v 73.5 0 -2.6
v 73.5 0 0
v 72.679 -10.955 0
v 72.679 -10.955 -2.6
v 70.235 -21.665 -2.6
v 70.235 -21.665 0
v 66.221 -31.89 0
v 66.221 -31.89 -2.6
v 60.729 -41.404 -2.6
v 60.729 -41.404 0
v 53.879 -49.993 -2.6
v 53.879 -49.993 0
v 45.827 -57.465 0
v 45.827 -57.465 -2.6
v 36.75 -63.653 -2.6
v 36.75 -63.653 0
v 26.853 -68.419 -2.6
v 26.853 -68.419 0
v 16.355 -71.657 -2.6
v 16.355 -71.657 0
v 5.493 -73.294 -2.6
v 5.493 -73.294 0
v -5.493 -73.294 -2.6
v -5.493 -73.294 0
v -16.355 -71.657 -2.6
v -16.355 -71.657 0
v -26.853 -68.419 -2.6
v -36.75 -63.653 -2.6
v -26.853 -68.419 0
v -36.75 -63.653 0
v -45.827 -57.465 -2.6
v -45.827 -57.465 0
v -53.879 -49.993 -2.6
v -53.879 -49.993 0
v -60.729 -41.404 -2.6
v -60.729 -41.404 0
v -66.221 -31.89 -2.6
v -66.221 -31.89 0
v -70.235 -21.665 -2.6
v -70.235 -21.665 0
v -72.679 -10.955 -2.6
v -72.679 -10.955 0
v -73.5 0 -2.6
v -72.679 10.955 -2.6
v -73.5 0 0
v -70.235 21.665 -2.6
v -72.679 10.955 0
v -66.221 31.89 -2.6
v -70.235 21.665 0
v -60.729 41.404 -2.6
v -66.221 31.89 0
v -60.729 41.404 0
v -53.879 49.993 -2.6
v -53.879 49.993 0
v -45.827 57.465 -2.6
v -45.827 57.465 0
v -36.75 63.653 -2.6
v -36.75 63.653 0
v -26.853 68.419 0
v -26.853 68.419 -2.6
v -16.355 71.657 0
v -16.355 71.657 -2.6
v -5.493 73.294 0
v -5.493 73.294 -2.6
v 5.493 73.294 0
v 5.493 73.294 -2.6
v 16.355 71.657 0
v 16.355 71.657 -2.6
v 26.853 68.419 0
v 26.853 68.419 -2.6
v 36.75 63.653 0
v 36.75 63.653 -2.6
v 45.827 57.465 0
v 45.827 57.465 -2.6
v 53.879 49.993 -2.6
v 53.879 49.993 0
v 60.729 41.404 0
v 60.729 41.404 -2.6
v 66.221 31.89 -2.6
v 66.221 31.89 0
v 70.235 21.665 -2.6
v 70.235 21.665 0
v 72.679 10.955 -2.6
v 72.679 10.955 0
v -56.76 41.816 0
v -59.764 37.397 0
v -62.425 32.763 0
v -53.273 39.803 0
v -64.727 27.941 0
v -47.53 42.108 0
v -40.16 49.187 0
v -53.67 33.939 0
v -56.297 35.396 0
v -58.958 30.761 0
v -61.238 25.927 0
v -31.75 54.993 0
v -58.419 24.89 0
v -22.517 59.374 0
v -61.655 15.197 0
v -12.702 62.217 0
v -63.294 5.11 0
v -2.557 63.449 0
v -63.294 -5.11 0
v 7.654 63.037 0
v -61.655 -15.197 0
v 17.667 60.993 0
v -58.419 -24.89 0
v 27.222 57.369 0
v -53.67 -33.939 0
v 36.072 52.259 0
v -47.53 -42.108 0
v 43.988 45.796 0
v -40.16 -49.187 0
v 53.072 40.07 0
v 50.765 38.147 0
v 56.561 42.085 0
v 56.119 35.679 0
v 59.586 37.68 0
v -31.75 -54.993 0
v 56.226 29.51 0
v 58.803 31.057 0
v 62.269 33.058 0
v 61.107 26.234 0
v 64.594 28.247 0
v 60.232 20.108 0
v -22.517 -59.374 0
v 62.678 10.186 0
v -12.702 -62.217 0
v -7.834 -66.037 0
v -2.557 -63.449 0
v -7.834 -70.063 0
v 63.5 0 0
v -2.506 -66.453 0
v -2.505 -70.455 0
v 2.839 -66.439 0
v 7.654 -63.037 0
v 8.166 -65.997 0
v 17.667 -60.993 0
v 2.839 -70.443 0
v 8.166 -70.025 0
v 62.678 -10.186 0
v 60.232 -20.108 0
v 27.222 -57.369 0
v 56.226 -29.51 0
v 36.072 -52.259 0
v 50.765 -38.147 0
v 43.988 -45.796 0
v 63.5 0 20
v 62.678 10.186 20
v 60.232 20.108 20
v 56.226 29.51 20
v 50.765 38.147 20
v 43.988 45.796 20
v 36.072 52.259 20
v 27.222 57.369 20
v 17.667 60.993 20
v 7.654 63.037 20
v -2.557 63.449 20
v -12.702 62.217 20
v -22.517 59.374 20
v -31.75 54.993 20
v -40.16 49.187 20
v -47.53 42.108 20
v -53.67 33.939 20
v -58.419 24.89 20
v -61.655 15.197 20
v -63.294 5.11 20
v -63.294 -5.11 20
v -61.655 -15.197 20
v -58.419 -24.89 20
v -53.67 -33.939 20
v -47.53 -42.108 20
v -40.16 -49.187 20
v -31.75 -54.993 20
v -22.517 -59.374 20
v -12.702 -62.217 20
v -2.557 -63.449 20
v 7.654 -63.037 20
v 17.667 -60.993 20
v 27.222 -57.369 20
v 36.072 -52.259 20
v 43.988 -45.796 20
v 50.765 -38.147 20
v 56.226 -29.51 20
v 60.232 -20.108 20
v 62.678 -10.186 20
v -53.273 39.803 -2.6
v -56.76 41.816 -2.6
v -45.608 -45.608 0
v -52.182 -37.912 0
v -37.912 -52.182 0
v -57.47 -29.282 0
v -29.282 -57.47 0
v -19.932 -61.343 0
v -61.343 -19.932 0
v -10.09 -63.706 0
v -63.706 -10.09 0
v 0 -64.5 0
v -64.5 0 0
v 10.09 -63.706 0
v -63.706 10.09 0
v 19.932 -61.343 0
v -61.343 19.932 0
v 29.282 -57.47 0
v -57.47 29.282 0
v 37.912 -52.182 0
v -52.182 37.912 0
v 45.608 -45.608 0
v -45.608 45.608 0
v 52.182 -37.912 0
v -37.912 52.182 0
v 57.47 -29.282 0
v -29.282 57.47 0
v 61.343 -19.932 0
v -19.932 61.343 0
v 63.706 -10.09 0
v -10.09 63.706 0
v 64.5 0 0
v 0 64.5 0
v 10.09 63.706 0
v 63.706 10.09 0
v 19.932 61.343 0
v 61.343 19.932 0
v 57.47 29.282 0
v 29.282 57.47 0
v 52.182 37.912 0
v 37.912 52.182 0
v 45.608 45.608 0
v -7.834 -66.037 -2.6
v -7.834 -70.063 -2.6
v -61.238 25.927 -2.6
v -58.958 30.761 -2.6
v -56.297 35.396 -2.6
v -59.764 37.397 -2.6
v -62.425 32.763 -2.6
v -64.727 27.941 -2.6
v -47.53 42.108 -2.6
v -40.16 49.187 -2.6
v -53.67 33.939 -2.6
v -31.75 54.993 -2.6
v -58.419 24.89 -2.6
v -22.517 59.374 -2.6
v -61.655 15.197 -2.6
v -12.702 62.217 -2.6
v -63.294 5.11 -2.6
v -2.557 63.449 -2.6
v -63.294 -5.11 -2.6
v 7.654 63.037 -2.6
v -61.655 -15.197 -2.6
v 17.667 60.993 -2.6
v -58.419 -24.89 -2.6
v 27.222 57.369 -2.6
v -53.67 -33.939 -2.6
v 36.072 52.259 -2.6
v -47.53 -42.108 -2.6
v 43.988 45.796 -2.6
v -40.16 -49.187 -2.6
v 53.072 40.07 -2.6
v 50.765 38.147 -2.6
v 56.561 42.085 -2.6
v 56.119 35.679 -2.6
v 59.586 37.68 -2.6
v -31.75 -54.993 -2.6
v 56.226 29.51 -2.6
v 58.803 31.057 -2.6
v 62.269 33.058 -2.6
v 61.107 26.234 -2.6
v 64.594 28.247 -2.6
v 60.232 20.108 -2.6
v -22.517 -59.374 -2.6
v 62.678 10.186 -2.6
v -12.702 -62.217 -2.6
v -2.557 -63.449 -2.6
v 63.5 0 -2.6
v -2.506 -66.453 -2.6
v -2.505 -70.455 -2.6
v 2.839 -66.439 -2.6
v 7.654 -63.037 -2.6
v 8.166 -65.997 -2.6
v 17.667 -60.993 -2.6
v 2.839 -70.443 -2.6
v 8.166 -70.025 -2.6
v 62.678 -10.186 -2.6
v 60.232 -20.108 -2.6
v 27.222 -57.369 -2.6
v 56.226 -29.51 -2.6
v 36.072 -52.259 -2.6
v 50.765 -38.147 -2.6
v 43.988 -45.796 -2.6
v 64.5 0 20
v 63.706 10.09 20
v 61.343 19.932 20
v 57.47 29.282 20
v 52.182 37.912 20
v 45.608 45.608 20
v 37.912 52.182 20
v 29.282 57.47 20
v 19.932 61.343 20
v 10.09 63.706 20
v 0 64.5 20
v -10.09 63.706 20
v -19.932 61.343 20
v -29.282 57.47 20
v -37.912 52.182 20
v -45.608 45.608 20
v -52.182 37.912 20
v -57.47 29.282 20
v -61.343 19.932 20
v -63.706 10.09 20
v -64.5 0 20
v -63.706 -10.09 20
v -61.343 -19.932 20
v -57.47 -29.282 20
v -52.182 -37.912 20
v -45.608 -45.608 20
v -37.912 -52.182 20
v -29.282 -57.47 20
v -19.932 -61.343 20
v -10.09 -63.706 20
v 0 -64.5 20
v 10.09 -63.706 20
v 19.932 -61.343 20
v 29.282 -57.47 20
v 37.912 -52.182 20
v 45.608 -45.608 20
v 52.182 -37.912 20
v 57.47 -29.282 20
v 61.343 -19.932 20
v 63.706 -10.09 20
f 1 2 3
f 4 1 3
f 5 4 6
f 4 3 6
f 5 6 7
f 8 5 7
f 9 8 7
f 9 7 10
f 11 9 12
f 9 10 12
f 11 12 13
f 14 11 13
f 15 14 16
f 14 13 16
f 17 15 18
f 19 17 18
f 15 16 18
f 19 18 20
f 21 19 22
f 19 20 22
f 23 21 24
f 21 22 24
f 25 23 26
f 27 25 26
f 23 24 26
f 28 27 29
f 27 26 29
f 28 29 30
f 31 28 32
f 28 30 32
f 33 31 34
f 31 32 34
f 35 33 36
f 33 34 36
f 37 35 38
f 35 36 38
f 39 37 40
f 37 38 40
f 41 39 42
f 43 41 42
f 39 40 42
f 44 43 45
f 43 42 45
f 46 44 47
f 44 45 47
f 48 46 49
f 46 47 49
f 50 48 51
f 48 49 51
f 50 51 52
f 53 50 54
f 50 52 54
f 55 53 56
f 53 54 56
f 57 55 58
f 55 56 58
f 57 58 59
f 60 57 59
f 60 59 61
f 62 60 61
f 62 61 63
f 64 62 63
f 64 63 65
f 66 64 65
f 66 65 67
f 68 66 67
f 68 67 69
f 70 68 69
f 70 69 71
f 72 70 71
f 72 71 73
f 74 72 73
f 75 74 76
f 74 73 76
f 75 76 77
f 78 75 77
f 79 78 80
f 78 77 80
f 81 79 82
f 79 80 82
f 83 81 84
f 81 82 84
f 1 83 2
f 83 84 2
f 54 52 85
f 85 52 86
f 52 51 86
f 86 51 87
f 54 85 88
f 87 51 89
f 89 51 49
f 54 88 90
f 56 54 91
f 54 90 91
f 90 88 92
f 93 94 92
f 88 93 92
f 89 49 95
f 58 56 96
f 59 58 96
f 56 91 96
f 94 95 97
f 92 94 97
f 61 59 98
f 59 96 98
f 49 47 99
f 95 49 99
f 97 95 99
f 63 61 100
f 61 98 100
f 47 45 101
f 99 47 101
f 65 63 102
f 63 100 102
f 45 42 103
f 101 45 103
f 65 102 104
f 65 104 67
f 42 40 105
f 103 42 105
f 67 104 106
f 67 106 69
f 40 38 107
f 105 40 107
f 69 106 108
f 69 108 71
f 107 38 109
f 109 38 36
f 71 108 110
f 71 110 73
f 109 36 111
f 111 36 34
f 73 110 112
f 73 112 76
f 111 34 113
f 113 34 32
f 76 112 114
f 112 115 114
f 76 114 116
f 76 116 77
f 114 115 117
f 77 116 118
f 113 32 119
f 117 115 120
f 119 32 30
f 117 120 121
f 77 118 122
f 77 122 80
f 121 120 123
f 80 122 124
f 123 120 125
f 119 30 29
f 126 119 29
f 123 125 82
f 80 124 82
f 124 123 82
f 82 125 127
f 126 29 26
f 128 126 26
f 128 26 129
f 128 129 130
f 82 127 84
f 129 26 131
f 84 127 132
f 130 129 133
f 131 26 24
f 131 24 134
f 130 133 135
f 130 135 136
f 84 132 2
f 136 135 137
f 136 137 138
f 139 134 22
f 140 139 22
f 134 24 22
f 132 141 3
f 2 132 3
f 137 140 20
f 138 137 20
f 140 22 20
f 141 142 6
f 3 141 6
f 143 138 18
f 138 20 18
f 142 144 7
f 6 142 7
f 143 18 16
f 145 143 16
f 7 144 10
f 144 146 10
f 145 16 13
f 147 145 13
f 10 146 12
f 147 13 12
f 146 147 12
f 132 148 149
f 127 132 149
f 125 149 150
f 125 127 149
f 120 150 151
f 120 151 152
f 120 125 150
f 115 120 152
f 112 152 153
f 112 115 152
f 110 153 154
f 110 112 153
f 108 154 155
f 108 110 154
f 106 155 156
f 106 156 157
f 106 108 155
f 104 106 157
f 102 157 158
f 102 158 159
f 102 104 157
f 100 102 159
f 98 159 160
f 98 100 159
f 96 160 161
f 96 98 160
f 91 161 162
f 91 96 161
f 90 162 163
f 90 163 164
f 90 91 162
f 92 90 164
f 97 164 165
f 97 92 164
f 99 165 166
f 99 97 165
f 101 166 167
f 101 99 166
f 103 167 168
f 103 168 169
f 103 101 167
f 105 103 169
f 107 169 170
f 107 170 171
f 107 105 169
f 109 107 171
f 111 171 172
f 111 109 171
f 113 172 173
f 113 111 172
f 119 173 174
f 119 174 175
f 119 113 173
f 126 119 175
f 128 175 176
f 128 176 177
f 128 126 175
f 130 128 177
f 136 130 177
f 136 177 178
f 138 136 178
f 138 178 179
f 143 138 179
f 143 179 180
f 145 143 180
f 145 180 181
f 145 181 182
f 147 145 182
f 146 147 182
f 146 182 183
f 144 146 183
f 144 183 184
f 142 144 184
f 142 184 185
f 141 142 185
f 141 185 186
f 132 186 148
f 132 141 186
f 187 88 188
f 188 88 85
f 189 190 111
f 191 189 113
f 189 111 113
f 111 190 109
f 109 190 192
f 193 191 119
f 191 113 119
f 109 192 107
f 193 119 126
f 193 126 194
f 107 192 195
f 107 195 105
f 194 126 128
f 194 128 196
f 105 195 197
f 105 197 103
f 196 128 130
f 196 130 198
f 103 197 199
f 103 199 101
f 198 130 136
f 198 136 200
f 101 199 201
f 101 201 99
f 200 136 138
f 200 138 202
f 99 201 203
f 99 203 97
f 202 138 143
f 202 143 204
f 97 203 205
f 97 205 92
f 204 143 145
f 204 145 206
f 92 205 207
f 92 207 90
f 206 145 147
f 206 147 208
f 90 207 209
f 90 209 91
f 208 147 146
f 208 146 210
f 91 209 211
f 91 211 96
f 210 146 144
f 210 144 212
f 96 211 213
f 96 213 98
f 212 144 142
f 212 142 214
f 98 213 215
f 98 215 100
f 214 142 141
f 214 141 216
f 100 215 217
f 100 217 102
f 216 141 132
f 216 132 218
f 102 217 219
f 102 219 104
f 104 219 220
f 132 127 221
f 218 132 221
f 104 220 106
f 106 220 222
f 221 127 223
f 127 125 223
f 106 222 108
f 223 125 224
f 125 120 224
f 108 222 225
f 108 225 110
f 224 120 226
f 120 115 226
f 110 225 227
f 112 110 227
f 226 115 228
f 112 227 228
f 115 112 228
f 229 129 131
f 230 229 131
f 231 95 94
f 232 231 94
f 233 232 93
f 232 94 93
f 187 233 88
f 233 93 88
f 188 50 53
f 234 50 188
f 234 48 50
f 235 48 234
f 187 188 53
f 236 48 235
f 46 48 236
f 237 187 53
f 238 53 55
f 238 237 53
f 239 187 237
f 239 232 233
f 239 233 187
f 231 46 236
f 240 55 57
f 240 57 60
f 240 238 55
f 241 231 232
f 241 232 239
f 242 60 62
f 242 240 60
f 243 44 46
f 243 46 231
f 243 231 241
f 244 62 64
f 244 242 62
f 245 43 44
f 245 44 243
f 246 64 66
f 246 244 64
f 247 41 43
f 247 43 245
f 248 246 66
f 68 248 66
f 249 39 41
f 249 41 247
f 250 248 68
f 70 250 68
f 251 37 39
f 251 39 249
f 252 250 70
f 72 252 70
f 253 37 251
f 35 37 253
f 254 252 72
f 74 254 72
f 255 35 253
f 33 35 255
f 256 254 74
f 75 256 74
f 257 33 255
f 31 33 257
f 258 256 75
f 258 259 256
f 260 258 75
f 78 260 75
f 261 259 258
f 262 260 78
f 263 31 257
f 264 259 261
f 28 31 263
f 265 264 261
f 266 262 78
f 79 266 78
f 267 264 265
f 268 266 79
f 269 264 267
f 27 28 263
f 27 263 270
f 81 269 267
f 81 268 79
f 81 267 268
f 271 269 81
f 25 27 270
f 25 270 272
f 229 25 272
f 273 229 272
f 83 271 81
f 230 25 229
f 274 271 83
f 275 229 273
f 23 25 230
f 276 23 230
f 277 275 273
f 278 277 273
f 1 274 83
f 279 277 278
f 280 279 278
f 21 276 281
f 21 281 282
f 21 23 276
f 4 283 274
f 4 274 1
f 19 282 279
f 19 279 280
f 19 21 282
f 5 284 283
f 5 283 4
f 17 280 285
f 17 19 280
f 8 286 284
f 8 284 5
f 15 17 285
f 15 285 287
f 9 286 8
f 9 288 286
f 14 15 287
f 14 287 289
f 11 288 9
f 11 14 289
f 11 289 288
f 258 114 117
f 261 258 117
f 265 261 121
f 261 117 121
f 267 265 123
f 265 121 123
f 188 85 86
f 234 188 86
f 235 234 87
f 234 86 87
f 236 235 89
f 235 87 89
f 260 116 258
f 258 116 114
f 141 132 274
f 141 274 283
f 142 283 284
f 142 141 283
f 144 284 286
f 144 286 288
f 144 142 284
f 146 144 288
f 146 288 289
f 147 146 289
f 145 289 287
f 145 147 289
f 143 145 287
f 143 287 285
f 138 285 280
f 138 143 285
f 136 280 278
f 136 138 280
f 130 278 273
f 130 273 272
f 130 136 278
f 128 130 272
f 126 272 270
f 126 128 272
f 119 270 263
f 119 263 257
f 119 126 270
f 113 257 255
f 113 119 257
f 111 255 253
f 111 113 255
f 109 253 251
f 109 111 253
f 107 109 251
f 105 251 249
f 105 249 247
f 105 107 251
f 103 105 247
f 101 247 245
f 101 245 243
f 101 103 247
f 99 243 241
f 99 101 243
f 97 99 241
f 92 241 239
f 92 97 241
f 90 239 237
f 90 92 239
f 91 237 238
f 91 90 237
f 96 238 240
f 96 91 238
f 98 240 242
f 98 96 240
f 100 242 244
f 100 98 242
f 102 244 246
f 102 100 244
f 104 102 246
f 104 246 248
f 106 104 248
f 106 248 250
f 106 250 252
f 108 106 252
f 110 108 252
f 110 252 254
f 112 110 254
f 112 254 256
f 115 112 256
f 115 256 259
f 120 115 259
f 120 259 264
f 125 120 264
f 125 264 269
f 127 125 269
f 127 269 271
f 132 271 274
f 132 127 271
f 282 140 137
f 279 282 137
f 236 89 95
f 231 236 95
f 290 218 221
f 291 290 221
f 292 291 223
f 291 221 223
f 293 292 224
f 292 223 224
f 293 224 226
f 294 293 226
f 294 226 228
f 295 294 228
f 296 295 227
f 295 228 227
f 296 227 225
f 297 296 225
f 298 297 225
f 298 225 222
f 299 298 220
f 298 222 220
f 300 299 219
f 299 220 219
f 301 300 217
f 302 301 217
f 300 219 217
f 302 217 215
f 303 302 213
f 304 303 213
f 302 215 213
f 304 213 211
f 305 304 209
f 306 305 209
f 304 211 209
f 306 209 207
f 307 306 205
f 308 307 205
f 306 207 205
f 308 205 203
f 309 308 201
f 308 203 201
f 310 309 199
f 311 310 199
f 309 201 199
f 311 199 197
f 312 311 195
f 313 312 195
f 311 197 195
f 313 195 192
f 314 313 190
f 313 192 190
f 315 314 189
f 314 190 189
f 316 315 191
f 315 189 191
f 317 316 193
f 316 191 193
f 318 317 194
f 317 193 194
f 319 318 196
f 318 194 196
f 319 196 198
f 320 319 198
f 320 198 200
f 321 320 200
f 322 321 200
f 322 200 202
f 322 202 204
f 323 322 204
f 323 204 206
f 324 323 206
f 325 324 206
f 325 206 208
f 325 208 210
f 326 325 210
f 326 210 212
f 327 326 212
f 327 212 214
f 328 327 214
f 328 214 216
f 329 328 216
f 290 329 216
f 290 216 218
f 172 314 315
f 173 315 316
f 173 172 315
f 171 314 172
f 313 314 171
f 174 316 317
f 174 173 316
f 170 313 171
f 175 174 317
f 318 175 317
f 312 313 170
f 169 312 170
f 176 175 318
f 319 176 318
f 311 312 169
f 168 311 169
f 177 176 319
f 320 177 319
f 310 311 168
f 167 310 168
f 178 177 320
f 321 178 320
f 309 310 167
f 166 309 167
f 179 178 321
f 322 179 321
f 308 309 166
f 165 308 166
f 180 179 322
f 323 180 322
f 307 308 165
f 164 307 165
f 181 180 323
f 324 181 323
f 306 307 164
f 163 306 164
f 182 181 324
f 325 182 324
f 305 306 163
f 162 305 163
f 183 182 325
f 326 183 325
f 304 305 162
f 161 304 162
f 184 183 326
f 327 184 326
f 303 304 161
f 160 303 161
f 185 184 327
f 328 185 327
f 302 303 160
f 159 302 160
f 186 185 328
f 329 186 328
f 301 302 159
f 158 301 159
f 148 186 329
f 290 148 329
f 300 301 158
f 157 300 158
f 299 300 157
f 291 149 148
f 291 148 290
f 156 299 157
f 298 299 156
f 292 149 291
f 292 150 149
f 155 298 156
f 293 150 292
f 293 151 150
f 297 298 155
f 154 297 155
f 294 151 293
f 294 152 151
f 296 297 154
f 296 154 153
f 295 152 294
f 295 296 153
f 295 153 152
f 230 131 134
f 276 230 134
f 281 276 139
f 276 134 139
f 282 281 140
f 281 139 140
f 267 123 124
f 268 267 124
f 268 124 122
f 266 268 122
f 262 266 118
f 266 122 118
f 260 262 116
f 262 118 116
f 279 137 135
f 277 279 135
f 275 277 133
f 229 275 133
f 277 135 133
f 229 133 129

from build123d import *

# Parameters (mm, degrees)
F0_R     = 64.5
F0_R_2   = 63.5
F1_DEPTH = 20
F2_R     = 73.5
F2_R_2   = 64.5
F2_R_3   = 63.5
F3_DEPTH = 2.6


with BuildPart() as f1:
    # F0 (on Top) → F1 (new body)
    with BuildSketch(Plane.XY):
        Circle(F0_R)
        Circle(F0_R_2, mode=Mode.SUBTRACT)
    extrude(amount=F1_DEPTH)


with BuildPart() as f3:
    # F2 (on face) → F3 (new body)
    with BuildSketch(Plane(origin=(0, 0, 0), x_dir=(1, 0, 0), z_dir=(0, 0, -1))):
        Circle(F2_R)
        with BuildLine():
            Line((-53.272543663, -39.8030914839), (-56.759545298, -41.8163128165))
            ThreePointArc((-56.759545298, -41.8163128165), (-61.1380505803, -35.1053951871), (-64.7267495, -27.9409716932))
            Line((-64.7267495, -27.9409716932), (-61.2377470377, -25.9265951823))
            ThreePointArc((-61.2377470377, -25.9265951823), (-57.6740058995, -33.1052721407), (-53.272543663, -39.8030914839))
        make_face(mode=Mode.SUBTRACT)
        with BuildLine():
            Line((61.1067602057, -26.2338303944), (64.5937618407, -28.2470517271))
            ThreePointArc((64.5937618407, -28.2470517271), (60.971189332, -35.3944073469), (56.5609660427, -42.0845235248))
            Line((56.5609660427, -42.0845235248), (53.0719635804, -40.070147014))
            ThreePointArc((53.0719635804, -40.070147014), (57.5070096228, -33.3945181766), (61.1067602057, -26.2338303944))
        make_face(mode=Mode.SUBTRACT)
        Circle(F2_R_2, mode=Mode.SUBTRACT)
        with BuildLine():
            Line((-7.8342165427, 66.0369218783), (-7.8342165427, 70.0633645435))
            ThreePointArc((-7.8342165427, 70.0633645435), (0.1668612483, 70.4998025339), (8.1657834573, 70.025495218))
            Line((8.1657834573, 70.025495218), (8.1657834573, 65.9967421963))
            ThreePointArc((8.1657834573, 65.9967421963), (0.1669962767, 66.4997903173), (-7.8342165427, 66.0369218783))
        make_face(mode=Mode.SUBTRACT)
        Circle(F2_R_2)
        Circle(F2_R_3, mode=Mode.SUBTRACT)
    extrude(amount=F3_DEPTH)


solid = Compound([f1.part, f3.part])
